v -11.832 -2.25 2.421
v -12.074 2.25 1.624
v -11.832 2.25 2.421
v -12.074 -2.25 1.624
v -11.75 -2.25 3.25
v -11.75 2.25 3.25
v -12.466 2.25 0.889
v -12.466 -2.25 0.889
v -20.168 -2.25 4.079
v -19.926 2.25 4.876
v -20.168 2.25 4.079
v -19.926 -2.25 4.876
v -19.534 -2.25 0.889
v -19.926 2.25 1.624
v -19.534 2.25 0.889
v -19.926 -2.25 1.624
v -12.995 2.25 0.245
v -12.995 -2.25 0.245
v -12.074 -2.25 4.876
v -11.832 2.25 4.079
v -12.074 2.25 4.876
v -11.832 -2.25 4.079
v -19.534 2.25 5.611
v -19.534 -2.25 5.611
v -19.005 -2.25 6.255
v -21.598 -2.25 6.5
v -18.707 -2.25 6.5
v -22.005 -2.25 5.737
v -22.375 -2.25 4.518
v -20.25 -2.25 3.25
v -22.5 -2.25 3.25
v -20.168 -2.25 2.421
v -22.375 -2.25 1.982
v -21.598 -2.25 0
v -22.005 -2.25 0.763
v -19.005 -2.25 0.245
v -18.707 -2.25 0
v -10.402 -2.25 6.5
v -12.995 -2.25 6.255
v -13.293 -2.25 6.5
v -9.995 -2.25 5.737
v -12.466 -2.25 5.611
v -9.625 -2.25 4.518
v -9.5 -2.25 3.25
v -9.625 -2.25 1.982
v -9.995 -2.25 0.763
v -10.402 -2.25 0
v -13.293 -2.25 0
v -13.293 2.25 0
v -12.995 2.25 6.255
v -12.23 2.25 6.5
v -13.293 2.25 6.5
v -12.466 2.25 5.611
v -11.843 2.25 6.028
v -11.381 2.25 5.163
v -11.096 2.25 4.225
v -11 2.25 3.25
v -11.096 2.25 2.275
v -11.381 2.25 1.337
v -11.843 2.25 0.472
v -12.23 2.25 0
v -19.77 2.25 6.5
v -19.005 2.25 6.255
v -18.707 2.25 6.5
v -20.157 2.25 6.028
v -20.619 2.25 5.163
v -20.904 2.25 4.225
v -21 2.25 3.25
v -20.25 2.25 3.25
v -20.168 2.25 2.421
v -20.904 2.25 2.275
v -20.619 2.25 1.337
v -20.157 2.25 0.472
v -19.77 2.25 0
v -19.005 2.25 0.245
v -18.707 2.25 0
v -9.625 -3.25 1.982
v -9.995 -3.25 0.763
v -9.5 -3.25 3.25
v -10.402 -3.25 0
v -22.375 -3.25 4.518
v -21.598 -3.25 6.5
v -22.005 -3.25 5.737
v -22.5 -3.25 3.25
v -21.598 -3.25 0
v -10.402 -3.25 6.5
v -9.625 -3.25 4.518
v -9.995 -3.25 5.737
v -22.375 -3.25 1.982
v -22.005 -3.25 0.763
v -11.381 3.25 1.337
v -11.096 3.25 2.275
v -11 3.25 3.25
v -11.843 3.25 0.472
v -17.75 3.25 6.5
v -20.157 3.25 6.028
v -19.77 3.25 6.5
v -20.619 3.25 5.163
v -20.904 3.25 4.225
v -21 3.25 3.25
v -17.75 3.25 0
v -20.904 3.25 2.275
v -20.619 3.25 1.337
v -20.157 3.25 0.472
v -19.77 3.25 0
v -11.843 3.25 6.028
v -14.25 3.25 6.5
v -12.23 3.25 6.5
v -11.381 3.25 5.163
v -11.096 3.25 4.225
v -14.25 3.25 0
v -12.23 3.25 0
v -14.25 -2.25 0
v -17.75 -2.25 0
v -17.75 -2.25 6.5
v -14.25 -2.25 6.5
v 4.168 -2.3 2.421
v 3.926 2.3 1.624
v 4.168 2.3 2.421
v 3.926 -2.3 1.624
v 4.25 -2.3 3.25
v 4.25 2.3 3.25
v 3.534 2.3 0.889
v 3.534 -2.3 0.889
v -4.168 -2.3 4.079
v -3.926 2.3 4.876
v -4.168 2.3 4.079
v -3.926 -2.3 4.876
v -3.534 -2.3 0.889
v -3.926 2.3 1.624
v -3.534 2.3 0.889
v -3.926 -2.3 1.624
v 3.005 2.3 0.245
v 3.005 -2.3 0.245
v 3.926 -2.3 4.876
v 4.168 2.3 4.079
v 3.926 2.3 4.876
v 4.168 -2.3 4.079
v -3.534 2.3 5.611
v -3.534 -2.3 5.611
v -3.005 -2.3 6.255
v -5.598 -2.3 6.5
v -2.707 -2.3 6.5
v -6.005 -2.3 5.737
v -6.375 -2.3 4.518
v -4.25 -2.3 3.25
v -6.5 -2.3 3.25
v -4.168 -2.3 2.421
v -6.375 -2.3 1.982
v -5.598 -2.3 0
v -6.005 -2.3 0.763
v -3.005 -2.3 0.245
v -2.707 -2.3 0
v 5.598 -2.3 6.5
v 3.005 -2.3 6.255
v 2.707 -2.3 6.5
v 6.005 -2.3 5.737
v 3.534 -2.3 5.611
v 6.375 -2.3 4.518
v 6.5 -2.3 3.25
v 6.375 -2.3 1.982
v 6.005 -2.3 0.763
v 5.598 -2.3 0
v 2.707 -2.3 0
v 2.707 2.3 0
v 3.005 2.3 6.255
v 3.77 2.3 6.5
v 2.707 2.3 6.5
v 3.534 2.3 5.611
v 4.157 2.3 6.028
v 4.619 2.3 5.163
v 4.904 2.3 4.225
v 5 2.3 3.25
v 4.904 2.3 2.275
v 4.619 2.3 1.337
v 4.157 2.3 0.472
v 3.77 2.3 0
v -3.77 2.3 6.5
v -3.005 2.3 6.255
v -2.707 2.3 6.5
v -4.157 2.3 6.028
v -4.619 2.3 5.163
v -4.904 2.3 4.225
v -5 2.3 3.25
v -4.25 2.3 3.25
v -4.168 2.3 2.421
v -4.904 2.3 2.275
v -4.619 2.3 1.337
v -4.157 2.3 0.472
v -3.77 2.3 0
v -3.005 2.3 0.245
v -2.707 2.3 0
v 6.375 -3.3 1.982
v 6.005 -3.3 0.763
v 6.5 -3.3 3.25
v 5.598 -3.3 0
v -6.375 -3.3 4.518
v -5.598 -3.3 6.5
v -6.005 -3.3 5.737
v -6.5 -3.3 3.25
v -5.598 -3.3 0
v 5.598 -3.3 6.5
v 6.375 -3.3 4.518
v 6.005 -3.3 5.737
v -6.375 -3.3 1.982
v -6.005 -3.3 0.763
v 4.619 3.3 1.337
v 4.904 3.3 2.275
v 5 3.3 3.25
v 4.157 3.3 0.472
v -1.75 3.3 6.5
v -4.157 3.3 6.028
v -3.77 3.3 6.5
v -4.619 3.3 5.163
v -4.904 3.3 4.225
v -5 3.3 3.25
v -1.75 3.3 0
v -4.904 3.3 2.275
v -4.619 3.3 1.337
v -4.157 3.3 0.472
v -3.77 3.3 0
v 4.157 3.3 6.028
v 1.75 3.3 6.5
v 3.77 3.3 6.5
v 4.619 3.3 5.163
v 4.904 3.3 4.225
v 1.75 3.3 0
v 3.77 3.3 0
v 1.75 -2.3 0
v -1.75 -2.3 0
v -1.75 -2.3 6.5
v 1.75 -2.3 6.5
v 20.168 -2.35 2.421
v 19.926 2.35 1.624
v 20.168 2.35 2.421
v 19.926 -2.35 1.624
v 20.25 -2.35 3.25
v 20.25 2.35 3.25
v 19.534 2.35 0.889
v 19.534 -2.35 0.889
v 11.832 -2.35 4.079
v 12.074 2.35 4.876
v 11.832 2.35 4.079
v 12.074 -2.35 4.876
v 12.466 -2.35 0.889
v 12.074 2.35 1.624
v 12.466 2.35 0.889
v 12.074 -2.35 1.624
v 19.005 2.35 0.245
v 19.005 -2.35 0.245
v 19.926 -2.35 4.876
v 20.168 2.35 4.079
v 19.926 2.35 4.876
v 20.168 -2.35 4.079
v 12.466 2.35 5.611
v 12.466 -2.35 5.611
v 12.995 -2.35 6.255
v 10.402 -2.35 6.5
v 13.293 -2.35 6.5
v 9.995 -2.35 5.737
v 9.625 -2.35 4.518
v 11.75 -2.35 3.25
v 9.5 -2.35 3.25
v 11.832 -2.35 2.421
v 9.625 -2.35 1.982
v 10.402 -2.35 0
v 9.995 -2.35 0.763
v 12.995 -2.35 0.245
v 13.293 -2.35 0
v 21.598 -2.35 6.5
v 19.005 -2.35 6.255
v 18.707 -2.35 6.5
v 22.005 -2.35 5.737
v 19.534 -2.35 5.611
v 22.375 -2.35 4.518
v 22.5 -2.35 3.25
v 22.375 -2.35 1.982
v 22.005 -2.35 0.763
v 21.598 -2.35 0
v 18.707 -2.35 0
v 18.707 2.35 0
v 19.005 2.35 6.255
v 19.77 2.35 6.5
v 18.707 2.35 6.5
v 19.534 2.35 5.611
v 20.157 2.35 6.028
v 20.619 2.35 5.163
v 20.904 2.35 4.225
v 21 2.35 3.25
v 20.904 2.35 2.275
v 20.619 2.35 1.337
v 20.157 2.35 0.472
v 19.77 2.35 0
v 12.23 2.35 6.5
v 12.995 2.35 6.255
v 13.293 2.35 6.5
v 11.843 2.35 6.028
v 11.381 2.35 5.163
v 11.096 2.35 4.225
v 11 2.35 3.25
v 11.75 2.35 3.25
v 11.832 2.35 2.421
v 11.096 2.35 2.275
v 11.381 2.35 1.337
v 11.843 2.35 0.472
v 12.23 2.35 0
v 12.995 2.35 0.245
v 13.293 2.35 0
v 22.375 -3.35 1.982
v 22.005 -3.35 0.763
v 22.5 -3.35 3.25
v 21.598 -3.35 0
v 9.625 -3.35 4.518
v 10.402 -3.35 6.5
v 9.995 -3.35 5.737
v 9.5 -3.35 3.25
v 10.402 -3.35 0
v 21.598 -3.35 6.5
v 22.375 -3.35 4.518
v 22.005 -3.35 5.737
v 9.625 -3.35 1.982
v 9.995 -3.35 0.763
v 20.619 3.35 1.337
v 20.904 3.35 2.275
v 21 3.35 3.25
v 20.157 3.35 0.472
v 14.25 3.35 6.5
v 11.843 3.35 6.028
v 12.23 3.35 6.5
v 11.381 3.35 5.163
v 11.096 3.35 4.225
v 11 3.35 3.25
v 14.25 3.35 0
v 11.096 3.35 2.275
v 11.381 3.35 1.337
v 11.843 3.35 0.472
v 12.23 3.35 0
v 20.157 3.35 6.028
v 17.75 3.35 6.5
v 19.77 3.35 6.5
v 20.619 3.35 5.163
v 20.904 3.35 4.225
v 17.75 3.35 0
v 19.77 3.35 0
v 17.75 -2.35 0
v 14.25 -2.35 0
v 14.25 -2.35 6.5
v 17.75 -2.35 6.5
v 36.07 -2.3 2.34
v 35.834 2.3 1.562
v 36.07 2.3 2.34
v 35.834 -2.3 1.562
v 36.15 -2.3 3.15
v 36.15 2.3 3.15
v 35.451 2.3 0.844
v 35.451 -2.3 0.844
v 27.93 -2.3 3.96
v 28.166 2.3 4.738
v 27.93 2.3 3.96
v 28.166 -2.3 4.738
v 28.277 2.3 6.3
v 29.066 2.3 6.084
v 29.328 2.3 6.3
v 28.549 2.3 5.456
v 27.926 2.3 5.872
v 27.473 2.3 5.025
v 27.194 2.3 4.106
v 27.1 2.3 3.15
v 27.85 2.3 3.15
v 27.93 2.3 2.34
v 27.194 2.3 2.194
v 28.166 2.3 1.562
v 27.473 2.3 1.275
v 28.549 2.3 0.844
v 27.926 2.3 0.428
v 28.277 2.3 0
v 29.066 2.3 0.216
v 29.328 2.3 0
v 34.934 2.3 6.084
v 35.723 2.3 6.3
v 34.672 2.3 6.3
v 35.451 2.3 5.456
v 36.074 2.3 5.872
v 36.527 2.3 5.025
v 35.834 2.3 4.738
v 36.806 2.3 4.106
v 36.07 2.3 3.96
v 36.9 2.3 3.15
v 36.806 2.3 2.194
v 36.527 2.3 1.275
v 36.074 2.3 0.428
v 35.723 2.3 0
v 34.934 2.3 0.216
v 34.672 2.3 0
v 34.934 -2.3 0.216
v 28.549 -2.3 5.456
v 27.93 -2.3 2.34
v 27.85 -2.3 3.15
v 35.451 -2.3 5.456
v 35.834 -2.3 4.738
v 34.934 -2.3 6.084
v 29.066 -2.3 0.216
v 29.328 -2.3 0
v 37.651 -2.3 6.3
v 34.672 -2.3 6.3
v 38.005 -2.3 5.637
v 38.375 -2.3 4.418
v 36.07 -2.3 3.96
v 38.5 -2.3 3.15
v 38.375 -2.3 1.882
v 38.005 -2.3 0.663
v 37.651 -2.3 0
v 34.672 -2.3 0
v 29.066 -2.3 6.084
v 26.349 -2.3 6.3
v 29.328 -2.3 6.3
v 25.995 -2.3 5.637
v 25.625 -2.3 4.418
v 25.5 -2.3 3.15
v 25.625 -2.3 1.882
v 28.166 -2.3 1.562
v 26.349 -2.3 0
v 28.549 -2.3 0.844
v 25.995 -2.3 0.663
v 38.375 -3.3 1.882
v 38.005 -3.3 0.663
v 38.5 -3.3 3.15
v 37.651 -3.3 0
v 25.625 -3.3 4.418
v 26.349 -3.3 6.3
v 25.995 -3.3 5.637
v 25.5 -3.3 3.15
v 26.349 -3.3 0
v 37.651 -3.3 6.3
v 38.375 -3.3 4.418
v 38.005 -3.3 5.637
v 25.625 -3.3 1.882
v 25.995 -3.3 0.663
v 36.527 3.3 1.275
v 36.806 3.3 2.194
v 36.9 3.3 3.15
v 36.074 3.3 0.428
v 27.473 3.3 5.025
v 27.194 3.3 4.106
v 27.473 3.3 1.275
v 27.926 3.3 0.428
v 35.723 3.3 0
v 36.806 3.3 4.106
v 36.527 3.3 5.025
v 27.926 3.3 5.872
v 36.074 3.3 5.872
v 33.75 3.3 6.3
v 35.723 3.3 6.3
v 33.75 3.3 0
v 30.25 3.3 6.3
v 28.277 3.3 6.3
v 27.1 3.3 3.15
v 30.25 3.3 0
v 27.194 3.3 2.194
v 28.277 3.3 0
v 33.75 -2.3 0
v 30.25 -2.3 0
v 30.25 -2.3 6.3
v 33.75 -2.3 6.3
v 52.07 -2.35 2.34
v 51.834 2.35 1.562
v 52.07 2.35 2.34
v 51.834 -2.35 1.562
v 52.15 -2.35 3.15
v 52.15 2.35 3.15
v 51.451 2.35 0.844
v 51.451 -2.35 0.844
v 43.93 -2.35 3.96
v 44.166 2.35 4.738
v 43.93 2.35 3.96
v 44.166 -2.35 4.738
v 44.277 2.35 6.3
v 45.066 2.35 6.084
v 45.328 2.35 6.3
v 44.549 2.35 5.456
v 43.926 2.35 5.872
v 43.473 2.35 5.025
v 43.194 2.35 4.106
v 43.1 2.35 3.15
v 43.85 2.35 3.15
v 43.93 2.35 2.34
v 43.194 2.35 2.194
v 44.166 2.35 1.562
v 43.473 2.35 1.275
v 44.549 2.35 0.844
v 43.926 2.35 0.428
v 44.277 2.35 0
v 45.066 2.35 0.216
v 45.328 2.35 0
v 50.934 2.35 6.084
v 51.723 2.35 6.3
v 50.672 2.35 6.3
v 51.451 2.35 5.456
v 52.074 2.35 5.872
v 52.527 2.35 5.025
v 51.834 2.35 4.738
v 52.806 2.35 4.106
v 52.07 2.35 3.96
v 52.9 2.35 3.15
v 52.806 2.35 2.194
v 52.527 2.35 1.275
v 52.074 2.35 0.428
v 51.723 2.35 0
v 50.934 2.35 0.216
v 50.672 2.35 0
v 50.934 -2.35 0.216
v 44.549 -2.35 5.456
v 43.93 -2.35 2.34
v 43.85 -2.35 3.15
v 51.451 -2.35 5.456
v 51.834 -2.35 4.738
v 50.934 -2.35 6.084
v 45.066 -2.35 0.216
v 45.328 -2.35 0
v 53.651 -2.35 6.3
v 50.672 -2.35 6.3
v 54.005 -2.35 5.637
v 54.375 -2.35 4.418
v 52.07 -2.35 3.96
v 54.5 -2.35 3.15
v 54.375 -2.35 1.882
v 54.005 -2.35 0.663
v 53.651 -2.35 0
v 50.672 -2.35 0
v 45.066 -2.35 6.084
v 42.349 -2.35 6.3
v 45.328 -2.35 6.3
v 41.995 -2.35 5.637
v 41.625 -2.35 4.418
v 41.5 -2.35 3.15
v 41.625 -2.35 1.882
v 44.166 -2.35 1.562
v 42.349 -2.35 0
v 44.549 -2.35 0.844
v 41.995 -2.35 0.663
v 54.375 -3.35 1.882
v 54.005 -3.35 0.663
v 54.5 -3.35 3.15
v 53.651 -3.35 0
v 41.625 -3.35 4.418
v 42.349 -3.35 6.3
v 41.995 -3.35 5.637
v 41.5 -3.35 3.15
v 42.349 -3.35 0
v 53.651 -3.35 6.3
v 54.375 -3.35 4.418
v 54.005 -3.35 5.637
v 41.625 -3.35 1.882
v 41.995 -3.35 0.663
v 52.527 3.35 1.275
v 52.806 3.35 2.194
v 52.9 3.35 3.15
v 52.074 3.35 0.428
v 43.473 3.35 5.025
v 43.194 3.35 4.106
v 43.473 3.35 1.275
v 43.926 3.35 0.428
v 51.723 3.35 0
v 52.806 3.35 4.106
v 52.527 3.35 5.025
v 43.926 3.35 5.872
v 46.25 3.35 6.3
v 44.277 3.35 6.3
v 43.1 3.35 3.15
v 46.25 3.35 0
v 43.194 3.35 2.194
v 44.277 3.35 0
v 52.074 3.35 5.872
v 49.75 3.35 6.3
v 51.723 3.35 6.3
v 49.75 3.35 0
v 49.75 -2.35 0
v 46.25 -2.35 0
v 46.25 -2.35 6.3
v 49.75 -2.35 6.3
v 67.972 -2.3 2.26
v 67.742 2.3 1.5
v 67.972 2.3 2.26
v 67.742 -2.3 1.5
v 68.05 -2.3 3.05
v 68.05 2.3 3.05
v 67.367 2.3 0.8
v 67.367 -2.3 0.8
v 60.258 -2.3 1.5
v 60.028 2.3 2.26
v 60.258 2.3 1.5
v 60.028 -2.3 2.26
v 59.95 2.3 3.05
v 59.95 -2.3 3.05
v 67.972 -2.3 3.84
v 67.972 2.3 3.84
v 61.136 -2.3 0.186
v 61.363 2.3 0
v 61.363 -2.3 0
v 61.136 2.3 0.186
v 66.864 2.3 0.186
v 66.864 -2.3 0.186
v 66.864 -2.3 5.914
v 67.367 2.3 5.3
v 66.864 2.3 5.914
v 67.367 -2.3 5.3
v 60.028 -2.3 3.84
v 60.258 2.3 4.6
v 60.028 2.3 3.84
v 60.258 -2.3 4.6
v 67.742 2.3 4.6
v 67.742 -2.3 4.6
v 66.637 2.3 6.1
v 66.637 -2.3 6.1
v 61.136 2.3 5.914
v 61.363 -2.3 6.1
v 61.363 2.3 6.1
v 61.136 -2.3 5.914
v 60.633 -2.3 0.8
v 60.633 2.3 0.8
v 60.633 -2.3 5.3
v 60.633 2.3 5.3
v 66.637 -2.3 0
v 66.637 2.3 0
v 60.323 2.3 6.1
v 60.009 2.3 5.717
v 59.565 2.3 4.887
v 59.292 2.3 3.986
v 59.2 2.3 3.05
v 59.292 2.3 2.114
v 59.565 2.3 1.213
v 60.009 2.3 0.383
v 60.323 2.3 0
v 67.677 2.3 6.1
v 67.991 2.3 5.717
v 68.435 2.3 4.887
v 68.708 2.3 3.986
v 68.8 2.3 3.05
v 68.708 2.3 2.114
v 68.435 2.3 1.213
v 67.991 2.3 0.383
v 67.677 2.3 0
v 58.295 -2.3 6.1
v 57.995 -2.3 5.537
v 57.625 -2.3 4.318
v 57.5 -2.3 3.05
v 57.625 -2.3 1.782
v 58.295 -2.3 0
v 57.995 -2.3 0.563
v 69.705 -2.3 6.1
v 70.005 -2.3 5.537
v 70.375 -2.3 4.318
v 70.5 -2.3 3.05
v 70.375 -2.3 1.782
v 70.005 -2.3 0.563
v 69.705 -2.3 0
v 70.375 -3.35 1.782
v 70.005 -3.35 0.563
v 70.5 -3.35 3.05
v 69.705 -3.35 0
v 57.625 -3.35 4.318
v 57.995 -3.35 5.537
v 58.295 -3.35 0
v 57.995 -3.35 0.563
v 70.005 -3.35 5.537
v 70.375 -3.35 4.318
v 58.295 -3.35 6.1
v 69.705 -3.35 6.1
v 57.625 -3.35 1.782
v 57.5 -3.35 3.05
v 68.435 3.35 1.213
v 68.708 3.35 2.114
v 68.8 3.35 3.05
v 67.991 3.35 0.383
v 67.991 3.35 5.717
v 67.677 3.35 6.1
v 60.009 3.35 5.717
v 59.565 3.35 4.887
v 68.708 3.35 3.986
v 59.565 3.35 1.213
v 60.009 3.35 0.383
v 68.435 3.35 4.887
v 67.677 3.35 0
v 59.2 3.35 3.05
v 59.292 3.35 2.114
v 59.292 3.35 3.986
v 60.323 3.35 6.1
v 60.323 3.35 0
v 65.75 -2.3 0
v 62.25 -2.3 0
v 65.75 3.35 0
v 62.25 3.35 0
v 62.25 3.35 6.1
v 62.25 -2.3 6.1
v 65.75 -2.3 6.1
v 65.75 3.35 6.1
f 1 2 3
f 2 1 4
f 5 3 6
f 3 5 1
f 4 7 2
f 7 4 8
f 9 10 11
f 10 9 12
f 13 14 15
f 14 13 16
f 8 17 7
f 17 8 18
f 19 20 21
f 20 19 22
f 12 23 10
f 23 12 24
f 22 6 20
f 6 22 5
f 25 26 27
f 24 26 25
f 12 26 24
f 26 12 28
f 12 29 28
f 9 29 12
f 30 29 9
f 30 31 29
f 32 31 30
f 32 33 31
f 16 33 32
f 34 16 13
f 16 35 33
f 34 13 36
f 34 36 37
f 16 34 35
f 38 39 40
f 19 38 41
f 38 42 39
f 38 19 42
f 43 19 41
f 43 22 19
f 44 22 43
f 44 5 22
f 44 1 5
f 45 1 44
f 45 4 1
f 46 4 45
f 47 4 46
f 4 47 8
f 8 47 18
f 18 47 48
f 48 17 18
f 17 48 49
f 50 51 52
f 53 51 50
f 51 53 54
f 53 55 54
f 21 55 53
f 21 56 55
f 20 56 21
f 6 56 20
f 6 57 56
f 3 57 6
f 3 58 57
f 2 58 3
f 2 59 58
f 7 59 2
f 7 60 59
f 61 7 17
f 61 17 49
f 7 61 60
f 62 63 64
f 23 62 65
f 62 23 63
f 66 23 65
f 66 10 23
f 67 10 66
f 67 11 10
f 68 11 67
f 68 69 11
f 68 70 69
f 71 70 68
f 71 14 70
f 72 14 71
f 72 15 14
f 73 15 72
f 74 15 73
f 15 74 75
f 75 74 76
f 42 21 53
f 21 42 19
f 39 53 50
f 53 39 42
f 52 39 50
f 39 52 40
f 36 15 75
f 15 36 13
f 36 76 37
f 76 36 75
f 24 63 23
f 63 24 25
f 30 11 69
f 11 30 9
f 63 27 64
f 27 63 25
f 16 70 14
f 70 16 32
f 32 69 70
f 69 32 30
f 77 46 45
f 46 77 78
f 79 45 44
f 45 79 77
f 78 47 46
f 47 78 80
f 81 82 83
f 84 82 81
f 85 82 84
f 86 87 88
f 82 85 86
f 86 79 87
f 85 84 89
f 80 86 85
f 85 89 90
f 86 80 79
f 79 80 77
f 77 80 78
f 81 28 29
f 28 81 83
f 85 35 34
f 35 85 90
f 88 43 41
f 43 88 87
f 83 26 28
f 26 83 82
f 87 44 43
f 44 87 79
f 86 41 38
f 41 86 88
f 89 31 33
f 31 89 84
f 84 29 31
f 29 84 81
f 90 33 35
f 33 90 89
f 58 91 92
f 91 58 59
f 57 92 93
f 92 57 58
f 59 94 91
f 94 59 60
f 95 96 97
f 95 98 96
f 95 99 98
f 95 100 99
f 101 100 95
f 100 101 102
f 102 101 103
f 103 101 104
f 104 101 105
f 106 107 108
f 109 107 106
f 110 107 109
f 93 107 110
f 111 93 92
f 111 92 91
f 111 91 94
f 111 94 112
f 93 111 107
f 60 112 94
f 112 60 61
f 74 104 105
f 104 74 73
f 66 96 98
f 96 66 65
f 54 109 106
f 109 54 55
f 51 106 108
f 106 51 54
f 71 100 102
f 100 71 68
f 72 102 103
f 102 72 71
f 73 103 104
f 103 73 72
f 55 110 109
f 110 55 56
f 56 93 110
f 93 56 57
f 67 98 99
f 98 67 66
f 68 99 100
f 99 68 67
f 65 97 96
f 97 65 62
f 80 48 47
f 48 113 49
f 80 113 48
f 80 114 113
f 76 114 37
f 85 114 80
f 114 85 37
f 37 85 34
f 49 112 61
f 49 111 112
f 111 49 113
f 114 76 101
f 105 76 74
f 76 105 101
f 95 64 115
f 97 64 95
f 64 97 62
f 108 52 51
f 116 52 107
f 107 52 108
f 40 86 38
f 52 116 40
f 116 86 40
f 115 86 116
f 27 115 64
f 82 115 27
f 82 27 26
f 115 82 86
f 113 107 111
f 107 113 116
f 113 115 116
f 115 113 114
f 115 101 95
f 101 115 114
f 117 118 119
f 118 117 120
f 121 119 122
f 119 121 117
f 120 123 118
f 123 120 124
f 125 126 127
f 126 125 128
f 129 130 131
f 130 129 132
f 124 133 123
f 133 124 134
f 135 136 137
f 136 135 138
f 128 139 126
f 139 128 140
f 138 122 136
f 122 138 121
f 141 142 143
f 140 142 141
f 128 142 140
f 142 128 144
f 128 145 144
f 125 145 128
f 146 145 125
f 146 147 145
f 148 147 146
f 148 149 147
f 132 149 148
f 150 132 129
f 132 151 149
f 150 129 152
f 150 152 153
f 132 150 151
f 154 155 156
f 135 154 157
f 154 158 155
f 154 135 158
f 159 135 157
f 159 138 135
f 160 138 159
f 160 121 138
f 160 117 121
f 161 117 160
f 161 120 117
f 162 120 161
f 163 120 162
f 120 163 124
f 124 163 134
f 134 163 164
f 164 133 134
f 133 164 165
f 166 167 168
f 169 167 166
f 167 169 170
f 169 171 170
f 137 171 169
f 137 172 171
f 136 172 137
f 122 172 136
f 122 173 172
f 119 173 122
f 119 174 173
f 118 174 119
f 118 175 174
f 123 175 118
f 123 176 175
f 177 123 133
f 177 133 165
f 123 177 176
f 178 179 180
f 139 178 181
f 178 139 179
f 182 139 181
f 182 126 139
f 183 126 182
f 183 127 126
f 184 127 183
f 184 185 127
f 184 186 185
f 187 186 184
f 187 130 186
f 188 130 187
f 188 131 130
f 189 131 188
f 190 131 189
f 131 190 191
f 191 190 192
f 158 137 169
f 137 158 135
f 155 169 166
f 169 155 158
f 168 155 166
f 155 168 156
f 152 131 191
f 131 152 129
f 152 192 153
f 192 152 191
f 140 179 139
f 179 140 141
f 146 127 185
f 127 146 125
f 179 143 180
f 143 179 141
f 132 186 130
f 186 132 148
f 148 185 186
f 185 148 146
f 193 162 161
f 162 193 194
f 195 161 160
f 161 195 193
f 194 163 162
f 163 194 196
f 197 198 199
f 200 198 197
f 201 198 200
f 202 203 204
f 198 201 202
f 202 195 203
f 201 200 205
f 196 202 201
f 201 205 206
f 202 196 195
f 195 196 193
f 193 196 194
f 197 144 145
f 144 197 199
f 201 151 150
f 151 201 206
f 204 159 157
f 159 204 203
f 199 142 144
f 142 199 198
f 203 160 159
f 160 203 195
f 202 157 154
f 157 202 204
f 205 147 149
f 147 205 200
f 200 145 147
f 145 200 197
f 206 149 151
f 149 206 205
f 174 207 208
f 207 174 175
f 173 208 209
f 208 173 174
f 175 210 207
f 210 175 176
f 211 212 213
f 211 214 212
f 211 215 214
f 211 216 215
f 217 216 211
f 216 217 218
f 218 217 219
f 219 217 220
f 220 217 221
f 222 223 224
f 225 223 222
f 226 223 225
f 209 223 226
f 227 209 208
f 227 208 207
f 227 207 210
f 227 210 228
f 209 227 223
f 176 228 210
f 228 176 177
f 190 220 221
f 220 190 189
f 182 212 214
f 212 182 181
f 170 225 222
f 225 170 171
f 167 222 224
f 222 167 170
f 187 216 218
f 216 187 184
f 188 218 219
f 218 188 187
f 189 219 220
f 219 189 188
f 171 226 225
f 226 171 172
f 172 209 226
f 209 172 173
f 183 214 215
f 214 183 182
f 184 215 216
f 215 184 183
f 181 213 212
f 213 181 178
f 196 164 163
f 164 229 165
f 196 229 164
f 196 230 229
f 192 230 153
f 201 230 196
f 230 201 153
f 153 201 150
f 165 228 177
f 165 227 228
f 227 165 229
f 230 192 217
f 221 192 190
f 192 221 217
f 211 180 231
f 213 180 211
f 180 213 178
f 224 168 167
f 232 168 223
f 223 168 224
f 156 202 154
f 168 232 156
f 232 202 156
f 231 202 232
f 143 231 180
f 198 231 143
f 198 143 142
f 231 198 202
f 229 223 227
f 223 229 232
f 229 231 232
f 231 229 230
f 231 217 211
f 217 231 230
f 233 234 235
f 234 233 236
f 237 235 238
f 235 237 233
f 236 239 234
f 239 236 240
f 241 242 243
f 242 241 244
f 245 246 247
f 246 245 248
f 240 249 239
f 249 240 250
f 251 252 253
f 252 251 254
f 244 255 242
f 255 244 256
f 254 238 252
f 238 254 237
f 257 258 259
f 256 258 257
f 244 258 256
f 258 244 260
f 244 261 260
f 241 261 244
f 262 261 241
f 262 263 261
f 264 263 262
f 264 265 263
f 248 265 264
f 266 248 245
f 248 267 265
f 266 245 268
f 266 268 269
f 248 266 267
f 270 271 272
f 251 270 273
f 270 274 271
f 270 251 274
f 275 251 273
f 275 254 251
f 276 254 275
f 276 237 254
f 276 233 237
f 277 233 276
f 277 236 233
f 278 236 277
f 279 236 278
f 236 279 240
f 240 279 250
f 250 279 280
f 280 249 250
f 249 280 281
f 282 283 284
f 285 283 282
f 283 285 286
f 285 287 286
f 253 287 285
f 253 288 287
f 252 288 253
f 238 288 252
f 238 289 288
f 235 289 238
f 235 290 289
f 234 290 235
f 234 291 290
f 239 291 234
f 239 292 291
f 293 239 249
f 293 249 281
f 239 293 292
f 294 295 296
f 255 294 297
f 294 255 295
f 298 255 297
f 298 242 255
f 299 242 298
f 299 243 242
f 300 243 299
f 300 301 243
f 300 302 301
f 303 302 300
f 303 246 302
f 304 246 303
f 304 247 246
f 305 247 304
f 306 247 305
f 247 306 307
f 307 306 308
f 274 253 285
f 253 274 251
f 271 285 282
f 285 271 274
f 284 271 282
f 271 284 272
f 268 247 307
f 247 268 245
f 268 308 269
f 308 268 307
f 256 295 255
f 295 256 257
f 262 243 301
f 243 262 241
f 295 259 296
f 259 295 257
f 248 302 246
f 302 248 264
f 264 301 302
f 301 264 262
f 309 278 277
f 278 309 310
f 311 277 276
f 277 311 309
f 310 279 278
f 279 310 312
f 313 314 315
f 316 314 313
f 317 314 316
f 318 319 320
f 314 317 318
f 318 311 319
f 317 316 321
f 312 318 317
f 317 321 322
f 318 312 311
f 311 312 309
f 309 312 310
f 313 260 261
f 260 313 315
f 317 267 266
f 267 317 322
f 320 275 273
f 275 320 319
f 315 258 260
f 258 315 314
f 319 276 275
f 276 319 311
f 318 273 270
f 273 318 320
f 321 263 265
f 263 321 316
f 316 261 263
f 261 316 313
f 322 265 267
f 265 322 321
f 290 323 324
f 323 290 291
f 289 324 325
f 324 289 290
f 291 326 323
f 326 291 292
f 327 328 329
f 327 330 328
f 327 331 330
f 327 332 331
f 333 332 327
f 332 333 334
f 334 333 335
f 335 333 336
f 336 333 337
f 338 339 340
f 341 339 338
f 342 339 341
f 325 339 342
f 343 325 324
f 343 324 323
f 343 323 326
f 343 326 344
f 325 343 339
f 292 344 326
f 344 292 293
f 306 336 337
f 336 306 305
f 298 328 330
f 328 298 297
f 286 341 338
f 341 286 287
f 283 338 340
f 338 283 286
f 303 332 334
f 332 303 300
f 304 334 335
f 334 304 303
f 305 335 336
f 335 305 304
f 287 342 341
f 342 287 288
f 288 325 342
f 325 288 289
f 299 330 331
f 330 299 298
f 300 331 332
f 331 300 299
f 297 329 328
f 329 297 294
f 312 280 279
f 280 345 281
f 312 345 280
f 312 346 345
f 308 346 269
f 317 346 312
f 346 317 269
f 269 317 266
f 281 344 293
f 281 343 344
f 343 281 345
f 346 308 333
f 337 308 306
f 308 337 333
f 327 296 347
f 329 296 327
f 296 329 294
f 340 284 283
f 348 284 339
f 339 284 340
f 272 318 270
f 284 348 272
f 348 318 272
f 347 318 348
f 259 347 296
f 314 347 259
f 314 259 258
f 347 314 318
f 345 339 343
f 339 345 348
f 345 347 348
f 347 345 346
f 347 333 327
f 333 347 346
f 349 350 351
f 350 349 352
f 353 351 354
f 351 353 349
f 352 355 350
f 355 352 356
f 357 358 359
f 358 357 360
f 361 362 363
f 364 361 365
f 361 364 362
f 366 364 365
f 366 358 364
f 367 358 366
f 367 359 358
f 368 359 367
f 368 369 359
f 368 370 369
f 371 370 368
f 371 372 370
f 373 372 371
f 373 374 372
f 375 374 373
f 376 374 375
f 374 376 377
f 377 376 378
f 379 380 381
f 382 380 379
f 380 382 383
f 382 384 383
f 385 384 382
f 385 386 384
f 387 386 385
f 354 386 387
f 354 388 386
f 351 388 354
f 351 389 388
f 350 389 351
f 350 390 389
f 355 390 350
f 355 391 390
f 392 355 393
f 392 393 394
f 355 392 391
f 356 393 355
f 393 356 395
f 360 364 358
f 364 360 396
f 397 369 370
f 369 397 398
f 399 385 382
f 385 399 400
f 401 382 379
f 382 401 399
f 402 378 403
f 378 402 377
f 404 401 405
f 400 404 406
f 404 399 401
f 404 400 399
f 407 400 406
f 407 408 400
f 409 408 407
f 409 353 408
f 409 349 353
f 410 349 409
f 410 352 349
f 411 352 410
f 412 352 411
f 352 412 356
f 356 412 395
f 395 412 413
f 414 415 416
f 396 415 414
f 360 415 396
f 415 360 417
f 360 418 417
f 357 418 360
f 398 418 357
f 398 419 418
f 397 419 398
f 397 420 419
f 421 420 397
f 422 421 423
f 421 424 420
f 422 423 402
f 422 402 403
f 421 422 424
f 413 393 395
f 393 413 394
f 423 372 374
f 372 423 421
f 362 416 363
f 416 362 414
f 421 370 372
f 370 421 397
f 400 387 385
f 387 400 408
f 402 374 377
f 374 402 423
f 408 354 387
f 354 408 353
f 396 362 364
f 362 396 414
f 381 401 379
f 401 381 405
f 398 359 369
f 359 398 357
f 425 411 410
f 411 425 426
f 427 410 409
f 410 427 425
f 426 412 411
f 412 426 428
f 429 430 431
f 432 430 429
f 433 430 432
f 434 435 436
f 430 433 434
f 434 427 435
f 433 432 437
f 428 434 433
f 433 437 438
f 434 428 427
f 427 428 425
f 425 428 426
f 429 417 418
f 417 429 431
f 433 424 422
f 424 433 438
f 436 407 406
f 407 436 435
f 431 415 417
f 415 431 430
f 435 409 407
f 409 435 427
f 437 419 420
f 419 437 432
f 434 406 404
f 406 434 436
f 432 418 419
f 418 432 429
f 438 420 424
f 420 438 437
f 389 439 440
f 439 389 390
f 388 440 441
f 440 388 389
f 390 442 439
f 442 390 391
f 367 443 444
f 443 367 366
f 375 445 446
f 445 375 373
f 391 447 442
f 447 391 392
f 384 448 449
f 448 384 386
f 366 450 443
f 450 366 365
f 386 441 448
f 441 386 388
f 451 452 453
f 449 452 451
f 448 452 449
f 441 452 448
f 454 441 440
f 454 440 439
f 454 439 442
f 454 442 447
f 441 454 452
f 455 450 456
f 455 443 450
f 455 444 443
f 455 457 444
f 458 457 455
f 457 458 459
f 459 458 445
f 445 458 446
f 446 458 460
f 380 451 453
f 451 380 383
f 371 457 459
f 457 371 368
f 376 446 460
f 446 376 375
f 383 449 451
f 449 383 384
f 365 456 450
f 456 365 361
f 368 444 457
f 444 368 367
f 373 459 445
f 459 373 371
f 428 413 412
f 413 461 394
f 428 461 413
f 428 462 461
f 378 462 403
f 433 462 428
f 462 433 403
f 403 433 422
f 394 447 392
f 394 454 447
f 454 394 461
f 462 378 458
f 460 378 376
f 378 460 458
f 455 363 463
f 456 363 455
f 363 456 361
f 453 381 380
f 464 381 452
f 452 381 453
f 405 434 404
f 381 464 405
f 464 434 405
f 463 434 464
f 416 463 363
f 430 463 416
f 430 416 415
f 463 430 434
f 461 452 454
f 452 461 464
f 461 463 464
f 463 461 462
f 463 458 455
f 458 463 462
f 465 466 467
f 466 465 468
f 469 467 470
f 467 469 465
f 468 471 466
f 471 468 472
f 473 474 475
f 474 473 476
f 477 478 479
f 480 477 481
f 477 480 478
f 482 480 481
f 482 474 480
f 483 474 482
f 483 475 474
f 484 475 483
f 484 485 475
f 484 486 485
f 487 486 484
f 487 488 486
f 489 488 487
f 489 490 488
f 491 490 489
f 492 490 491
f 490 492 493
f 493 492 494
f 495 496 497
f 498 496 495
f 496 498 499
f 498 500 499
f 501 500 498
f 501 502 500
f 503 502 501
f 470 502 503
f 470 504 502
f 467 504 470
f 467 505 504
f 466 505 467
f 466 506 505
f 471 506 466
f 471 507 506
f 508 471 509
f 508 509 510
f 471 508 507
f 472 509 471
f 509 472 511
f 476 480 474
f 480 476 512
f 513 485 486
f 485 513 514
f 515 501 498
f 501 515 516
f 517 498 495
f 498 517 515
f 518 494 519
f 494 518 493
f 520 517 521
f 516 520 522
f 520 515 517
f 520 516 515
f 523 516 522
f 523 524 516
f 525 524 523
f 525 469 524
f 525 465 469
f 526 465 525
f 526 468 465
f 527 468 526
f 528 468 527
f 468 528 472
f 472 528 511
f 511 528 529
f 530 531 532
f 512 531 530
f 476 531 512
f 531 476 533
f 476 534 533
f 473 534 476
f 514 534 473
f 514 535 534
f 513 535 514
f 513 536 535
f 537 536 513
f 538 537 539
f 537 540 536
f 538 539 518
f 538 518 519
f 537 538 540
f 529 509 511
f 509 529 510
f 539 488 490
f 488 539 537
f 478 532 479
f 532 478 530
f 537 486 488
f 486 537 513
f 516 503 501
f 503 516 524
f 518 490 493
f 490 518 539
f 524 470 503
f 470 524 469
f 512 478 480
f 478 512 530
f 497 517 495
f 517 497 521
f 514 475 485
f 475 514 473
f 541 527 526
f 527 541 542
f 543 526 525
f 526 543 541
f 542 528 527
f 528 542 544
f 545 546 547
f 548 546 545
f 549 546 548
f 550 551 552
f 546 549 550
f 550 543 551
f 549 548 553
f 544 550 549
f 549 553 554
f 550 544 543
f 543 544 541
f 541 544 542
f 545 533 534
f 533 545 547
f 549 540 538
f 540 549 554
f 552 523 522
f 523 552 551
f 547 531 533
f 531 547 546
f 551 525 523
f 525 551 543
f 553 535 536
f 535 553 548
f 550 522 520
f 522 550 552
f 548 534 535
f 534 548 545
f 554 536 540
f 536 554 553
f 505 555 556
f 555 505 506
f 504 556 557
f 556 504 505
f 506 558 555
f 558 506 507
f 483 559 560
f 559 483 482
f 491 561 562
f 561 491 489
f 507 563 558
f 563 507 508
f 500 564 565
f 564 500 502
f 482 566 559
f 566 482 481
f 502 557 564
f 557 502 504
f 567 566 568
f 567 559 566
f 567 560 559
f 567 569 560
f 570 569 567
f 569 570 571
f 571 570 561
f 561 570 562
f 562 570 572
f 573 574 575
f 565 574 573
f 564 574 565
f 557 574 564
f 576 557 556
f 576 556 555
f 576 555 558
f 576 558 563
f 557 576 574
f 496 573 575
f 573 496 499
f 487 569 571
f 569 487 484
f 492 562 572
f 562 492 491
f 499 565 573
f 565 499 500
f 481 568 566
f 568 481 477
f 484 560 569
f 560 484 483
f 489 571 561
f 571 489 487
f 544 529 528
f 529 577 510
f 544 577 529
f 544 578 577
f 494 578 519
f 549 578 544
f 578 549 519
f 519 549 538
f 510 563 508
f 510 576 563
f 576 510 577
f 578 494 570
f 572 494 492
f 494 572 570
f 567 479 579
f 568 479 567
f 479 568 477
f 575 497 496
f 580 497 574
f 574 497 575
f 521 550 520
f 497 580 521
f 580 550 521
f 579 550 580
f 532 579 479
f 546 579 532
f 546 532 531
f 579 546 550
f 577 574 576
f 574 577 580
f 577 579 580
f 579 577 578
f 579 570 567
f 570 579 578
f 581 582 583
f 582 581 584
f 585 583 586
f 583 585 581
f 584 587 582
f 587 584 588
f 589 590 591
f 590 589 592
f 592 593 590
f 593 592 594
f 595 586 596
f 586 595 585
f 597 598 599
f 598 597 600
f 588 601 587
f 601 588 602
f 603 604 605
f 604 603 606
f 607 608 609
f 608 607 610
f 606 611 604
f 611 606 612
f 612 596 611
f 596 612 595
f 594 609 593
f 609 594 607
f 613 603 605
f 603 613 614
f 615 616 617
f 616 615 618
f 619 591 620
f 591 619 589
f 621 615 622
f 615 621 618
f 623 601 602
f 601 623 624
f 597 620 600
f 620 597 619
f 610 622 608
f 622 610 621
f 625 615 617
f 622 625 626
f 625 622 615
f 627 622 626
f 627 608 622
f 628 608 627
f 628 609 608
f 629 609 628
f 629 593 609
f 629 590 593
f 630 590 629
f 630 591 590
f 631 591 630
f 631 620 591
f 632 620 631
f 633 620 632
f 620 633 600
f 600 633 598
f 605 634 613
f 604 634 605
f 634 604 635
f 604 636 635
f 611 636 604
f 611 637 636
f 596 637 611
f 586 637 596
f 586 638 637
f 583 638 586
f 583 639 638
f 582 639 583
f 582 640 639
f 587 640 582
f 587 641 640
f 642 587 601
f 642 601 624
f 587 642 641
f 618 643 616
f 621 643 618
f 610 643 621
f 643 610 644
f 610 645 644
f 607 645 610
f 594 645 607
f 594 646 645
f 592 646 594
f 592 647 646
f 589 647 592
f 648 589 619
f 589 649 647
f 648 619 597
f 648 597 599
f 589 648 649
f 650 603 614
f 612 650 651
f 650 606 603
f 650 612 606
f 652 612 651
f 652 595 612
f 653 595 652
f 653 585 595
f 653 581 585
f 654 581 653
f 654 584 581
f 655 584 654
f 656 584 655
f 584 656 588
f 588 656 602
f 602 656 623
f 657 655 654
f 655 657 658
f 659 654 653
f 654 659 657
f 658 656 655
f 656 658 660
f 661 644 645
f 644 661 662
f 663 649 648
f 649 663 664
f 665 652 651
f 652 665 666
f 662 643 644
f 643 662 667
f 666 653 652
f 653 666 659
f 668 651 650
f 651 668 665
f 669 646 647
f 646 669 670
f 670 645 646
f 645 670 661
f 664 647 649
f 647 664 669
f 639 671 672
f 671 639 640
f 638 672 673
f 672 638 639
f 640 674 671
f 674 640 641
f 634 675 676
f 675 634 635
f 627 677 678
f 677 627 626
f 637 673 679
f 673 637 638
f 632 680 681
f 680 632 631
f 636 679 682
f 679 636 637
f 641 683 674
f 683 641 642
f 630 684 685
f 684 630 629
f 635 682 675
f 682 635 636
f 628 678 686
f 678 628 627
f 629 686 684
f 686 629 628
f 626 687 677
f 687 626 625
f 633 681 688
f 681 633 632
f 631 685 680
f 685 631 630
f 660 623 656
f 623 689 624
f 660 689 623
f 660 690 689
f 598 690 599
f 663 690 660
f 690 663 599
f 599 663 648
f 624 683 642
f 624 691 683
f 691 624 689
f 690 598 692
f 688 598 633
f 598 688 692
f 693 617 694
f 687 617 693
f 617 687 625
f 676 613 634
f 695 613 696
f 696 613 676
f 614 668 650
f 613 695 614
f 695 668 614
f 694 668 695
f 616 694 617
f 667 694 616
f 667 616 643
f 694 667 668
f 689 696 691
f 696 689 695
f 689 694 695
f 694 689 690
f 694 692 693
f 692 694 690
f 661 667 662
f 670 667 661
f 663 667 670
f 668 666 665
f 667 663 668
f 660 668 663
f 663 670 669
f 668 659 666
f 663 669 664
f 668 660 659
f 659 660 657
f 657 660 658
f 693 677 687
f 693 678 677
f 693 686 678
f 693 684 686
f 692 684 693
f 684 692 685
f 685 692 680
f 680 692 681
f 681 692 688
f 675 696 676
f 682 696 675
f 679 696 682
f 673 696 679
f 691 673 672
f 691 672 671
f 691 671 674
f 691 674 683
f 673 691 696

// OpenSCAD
// file: Settings.scad
// -- Parameters --------------------------

$fn = 32;

// radius of the hole in the outer joint
r1 = 2;

// radius of the hole in the piece
r2 = 4.5;

// radius of the base of joints and width of sticks
r3 = 6.5;

// height of sticks and thickness of pieces.
h = 2;

// height of the base of the joints
h_base = 1;


// -- Base elements ----------------------

module joint(height=h, radius=r3) {
	cylinder(h=height, r=radius);
}

module joint_axis(height=h, radius=r2) {
	cylinder(h=height*10, r=radius, center=true);
}

module joint_sqaxis(height=h, radius=r2, delta_r=0.35) {
 	side = cos(45) * (radius * 2) - delta_r;
 	cube([side, side, height], center=true);
}

module bar(length, height=h, width=r3) { cube(size=[length, width, height]); }

// -- Utility ------------------------------

module at(x, y) {
	translate((2 * r3 + 3) * [x, y, 0]) child(); 
}

module atPoints2(p0, p1) {
	translate(p0) { child(); }
	translate(p1) { child(); }
}

module atPoints3(p0, p1, p2) {
	translate(p0) { child(); }
	translate(p1) { child(); }
	translate(p2) { child(); }
}

module atEnd(length) { atPoints2([0, 0, 0], [length, 0, 0]) child(); }
// main file
include <Settings.scad>

module clip(stick_count = 2, delta_r = 0.25, delta_h = 0.5, 
		tooth_len = 0.75, cutoff = 1, hole = 1.75) {
	hc = stick_count * h + delta_h;
	rc = r2 - delta_r;
	translate([0, 0, rc - cutoff]) rotate([-90, 0, 0])
		difference() {
			union() {
				cylinder(r = rc, h = hc, center = true);
				translate([0, 0, -(hc + h_base) / 2])
					cylinder(r = r3, h = h_base, center = true);
				translate([0, 0, (hc + h_base) / 2]) 
					cylinder(r = rc + tooth_len, h = h_base, center = true);
			}
			translate([0, 2 * rc - cutoff, 0])
				cube([2 * r3, 2 * rc, hc + 2 * h_base + 1], center = true);
			translate([0, -2 * rc + cutoff, 0])
				cube([2 * r3, 2 * rc, hc + 2 * h_base + 1], center = true);
			translate([0, 0, h_base])
				cube([2 * hole, 2 * r3, hc + 2 * h_base], center = true);
		}
}

at(-1,0) clip();
at(0,0) clip(delta_h = 0.6);
at(1,0) clip(delta_h = 0.7);
at(2,0) clip(delta_h = 0.6, delta_r = 0.35);
at(3,0) clip(delta_h = 0.7, delta_r = 0.35);
at(4,0) clip(delta_h = 0.6, delta_r = 0.45);
at(4,0) clip(delta_h = 0.7, delta_r = 0.45);
